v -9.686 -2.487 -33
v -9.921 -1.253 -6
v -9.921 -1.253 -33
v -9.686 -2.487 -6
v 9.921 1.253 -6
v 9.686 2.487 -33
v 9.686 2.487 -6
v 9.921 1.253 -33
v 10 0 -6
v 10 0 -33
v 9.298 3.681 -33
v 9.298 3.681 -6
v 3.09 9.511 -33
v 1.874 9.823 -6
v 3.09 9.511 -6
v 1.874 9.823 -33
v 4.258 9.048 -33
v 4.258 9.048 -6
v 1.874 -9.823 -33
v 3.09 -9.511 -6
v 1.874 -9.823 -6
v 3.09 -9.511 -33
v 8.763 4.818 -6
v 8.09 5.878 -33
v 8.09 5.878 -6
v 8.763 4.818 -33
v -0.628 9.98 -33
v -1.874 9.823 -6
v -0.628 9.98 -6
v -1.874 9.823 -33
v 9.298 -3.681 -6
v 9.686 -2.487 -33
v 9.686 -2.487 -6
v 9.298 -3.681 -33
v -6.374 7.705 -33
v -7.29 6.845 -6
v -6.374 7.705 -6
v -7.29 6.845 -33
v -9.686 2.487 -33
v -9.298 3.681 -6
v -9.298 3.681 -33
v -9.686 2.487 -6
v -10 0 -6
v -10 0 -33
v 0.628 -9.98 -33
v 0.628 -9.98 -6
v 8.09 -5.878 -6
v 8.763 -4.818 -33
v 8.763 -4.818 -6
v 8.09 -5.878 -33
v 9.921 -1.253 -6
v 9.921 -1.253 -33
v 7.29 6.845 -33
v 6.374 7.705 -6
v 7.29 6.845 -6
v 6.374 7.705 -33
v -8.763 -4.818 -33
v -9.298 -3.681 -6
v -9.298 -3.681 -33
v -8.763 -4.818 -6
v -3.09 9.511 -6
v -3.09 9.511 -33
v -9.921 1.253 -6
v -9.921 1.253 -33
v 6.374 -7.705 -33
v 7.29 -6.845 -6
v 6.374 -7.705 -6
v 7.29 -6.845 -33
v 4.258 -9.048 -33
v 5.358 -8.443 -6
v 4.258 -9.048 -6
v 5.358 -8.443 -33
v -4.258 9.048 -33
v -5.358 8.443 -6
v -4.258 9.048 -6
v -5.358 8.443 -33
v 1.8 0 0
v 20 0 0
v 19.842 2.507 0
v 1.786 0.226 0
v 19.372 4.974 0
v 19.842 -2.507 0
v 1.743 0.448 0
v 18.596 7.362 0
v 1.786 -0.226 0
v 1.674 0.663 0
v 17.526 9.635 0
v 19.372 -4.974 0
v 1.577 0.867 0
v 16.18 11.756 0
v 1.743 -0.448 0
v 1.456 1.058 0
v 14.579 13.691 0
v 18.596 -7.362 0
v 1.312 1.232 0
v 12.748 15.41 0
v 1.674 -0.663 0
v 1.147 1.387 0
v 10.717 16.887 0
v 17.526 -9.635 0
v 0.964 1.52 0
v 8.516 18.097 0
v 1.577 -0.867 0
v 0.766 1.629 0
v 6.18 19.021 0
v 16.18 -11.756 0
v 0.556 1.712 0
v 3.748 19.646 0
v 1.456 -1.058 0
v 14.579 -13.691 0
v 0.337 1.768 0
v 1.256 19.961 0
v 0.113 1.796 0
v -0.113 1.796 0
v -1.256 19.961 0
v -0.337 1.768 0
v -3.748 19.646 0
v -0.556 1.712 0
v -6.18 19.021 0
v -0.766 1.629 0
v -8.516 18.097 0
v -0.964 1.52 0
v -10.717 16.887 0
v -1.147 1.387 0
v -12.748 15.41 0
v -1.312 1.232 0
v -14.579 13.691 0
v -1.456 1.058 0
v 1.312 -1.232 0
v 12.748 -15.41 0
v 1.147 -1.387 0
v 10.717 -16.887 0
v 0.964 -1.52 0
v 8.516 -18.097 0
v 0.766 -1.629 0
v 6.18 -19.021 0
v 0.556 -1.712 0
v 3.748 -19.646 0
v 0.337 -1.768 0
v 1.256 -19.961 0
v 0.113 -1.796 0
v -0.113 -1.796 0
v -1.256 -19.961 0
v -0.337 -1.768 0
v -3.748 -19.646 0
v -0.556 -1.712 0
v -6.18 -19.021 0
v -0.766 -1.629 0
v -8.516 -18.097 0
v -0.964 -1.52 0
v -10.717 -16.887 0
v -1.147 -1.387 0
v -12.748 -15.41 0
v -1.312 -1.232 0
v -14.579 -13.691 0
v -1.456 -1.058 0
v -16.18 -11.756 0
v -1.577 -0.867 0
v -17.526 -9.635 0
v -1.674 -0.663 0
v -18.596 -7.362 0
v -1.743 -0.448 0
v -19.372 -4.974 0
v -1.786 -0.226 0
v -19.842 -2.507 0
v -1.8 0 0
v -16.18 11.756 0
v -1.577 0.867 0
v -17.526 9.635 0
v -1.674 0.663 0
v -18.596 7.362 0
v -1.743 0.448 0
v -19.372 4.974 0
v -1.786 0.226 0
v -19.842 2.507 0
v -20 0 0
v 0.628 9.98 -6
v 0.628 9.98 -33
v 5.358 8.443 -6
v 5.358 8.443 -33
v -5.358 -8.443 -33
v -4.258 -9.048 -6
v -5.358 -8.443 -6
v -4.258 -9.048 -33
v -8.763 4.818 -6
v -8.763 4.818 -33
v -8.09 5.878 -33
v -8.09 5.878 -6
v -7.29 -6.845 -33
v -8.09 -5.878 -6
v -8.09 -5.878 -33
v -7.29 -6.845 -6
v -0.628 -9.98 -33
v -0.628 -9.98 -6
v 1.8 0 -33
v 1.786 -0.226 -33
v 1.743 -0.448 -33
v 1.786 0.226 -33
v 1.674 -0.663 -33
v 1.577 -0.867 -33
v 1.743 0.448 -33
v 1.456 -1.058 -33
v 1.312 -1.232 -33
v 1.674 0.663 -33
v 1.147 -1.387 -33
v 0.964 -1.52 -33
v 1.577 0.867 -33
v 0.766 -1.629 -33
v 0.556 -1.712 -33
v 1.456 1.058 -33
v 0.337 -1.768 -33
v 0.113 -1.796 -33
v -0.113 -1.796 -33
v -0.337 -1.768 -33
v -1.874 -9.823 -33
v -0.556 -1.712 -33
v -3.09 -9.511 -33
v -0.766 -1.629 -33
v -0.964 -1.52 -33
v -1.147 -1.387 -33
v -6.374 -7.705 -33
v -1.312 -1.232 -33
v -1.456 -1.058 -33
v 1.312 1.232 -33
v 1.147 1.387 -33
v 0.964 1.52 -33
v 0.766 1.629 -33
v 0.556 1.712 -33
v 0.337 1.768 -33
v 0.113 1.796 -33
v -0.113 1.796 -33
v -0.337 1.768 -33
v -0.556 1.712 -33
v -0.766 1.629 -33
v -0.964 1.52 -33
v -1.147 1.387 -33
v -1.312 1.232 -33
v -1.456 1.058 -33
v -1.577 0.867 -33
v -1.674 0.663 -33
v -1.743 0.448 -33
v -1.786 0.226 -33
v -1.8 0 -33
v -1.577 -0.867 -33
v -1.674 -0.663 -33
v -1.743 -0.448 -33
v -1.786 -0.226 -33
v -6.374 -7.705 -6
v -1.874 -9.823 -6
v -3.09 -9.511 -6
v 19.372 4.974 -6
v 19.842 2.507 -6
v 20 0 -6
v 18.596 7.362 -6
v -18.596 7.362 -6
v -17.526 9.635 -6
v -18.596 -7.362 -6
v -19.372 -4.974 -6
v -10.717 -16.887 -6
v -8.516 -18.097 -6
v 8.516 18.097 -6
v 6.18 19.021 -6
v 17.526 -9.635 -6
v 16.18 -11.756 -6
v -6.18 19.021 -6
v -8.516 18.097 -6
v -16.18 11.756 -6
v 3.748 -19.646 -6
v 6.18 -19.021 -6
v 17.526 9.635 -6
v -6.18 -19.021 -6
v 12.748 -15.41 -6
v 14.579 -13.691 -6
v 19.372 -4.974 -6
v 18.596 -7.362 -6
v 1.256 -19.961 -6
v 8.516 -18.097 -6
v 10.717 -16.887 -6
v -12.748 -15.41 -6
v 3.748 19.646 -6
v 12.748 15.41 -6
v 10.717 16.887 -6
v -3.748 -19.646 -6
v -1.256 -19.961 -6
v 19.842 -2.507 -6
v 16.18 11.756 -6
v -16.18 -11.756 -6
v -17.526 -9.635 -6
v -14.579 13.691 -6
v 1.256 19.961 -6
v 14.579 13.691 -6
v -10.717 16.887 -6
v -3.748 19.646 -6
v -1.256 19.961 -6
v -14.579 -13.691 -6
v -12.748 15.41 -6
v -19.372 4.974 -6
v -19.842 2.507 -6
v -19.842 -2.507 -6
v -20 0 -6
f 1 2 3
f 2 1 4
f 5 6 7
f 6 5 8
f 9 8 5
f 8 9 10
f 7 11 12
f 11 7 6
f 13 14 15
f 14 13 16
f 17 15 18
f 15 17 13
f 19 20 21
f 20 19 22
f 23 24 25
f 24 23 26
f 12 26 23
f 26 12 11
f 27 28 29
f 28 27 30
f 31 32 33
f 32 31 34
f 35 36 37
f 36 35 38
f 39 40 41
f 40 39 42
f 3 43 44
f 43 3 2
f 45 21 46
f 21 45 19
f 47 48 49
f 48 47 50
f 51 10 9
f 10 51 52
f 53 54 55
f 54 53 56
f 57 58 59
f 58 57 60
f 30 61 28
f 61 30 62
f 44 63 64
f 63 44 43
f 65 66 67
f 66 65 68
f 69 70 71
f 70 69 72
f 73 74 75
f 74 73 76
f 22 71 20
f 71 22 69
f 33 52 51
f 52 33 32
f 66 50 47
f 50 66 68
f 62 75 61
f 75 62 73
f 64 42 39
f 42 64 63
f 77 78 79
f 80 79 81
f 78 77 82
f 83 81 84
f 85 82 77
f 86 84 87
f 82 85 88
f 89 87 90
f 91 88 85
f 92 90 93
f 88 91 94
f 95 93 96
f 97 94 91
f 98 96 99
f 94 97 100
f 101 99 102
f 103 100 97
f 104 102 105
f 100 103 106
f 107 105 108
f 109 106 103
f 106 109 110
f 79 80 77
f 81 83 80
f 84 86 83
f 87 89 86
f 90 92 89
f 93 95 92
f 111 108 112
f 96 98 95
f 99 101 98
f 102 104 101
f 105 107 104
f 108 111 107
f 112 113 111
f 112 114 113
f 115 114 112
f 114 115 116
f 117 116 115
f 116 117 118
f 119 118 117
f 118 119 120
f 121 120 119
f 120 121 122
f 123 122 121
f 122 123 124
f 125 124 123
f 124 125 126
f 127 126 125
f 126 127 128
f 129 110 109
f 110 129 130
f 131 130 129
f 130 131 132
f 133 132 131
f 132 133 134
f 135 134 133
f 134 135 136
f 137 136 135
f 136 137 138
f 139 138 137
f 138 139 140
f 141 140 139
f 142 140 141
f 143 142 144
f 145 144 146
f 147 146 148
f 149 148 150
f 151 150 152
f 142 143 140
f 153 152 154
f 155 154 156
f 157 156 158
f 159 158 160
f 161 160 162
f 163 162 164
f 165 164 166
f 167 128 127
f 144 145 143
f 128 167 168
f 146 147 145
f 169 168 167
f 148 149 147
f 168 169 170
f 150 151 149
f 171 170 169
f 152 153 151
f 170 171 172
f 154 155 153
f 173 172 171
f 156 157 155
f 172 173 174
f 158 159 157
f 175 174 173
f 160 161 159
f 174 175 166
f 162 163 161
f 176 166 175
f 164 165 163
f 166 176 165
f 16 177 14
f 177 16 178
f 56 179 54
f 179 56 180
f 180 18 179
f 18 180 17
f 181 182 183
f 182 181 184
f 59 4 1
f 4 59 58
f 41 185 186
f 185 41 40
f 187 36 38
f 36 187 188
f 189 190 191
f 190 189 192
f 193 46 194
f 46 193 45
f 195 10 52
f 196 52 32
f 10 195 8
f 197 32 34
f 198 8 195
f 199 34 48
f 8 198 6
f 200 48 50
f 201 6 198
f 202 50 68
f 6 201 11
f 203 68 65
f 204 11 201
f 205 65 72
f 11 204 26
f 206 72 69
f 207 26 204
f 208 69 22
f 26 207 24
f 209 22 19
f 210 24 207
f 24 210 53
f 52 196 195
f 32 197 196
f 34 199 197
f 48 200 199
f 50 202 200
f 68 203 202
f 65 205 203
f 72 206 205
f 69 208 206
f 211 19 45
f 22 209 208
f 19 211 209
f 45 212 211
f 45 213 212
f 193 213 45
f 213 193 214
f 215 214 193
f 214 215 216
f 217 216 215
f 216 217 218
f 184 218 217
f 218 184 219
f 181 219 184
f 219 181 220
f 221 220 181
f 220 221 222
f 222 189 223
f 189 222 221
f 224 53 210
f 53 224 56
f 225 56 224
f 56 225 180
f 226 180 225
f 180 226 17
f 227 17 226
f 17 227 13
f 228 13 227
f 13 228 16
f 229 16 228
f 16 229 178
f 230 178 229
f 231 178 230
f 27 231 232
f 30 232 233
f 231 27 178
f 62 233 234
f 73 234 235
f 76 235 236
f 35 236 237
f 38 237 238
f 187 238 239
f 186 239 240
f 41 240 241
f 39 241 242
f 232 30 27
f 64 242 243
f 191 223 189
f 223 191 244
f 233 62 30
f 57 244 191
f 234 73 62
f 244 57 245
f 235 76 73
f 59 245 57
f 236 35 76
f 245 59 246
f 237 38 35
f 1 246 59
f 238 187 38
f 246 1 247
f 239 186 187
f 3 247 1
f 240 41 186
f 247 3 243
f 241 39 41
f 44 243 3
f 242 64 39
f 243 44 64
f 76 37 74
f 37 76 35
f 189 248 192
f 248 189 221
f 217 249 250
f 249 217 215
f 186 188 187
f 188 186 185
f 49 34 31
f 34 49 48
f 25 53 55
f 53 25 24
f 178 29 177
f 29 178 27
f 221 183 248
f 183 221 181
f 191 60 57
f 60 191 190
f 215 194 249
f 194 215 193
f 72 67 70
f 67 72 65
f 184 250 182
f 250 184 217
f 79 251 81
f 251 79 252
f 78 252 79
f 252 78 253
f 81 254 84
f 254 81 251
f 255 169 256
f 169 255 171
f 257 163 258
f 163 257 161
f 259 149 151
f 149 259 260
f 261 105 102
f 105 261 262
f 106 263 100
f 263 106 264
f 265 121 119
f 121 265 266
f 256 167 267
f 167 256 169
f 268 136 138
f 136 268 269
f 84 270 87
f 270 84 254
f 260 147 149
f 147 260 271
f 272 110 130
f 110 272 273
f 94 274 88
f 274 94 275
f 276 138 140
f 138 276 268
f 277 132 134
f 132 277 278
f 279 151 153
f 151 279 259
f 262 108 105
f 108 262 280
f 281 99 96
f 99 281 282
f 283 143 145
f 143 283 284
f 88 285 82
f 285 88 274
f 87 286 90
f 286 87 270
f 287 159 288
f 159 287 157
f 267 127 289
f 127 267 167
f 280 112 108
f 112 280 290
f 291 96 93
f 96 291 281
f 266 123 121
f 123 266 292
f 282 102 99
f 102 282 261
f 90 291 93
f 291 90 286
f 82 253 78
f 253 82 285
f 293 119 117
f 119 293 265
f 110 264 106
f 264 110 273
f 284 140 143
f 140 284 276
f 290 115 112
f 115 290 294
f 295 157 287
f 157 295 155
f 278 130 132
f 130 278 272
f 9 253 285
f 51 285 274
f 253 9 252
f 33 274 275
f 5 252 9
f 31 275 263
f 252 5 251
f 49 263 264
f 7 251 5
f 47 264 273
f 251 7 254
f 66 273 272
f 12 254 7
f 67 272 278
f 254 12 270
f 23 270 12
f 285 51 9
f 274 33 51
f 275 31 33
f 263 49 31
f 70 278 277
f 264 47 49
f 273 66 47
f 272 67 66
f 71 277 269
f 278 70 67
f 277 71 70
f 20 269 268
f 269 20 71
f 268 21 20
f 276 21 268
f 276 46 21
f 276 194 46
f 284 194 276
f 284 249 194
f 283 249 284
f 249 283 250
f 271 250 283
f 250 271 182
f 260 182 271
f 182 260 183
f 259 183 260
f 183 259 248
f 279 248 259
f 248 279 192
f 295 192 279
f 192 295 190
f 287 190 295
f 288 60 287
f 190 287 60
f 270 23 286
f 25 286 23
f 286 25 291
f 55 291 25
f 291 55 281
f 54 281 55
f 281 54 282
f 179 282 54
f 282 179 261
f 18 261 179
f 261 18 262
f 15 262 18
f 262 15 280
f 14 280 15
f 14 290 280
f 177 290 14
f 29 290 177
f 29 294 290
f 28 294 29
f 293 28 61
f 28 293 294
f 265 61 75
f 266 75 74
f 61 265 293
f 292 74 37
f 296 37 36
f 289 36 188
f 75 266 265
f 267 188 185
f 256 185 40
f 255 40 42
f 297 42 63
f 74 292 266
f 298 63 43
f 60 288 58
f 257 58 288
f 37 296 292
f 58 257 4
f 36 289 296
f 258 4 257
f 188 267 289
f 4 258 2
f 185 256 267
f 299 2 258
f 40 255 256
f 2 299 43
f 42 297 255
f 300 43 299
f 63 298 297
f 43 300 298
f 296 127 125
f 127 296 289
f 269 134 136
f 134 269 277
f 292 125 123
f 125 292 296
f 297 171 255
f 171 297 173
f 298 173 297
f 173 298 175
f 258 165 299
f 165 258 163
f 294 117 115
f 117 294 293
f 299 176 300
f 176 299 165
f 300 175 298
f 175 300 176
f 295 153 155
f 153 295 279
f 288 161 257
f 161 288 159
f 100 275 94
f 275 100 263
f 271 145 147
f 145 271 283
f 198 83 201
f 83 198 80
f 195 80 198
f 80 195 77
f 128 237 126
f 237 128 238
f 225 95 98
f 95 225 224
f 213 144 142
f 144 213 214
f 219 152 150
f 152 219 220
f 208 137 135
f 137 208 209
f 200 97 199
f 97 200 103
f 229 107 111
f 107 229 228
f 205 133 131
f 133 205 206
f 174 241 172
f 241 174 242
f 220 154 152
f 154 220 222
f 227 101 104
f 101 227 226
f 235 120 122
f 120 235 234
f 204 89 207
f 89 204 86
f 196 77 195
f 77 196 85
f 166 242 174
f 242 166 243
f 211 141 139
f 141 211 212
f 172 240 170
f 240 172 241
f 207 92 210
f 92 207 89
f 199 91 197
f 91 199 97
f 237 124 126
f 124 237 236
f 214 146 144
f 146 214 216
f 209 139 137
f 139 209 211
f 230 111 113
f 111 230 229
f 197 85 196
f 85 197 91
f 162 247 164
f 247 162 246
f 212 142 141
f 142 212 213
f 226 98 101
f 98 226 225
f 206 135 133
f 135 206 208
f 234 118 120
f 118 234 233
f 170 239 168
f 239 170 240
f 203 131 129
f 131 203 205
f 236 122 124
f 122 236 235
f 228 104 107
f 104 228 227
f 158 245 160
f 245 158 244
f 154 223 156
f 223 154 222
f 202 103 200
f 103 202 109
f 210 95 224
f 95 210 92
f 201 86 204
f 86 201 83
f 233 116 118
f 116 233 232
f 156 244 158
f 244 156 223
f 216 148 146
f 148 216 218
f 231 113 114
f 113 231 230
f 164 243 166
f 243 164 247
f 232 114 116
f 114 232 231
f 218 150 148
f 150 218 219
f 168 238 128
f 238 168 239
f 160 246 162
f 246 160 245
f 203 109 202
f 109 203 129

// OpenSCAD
$fn = 50;


difference() {
	union() {
		translate(v = [0, 0, -33.0000000000]) {
			cylinder(h = 33, r = 10.0000000000);
		}
		translate(v = [0, 0, -6.0000000000]) {
			cylinder(h = 6, r = 20.0000000000);
		}
	}
	union() {
		#translate(v = [0, 0, -33]) {
			cylinder(h = 33, r = 1.8000000000);
		}
	}
}
